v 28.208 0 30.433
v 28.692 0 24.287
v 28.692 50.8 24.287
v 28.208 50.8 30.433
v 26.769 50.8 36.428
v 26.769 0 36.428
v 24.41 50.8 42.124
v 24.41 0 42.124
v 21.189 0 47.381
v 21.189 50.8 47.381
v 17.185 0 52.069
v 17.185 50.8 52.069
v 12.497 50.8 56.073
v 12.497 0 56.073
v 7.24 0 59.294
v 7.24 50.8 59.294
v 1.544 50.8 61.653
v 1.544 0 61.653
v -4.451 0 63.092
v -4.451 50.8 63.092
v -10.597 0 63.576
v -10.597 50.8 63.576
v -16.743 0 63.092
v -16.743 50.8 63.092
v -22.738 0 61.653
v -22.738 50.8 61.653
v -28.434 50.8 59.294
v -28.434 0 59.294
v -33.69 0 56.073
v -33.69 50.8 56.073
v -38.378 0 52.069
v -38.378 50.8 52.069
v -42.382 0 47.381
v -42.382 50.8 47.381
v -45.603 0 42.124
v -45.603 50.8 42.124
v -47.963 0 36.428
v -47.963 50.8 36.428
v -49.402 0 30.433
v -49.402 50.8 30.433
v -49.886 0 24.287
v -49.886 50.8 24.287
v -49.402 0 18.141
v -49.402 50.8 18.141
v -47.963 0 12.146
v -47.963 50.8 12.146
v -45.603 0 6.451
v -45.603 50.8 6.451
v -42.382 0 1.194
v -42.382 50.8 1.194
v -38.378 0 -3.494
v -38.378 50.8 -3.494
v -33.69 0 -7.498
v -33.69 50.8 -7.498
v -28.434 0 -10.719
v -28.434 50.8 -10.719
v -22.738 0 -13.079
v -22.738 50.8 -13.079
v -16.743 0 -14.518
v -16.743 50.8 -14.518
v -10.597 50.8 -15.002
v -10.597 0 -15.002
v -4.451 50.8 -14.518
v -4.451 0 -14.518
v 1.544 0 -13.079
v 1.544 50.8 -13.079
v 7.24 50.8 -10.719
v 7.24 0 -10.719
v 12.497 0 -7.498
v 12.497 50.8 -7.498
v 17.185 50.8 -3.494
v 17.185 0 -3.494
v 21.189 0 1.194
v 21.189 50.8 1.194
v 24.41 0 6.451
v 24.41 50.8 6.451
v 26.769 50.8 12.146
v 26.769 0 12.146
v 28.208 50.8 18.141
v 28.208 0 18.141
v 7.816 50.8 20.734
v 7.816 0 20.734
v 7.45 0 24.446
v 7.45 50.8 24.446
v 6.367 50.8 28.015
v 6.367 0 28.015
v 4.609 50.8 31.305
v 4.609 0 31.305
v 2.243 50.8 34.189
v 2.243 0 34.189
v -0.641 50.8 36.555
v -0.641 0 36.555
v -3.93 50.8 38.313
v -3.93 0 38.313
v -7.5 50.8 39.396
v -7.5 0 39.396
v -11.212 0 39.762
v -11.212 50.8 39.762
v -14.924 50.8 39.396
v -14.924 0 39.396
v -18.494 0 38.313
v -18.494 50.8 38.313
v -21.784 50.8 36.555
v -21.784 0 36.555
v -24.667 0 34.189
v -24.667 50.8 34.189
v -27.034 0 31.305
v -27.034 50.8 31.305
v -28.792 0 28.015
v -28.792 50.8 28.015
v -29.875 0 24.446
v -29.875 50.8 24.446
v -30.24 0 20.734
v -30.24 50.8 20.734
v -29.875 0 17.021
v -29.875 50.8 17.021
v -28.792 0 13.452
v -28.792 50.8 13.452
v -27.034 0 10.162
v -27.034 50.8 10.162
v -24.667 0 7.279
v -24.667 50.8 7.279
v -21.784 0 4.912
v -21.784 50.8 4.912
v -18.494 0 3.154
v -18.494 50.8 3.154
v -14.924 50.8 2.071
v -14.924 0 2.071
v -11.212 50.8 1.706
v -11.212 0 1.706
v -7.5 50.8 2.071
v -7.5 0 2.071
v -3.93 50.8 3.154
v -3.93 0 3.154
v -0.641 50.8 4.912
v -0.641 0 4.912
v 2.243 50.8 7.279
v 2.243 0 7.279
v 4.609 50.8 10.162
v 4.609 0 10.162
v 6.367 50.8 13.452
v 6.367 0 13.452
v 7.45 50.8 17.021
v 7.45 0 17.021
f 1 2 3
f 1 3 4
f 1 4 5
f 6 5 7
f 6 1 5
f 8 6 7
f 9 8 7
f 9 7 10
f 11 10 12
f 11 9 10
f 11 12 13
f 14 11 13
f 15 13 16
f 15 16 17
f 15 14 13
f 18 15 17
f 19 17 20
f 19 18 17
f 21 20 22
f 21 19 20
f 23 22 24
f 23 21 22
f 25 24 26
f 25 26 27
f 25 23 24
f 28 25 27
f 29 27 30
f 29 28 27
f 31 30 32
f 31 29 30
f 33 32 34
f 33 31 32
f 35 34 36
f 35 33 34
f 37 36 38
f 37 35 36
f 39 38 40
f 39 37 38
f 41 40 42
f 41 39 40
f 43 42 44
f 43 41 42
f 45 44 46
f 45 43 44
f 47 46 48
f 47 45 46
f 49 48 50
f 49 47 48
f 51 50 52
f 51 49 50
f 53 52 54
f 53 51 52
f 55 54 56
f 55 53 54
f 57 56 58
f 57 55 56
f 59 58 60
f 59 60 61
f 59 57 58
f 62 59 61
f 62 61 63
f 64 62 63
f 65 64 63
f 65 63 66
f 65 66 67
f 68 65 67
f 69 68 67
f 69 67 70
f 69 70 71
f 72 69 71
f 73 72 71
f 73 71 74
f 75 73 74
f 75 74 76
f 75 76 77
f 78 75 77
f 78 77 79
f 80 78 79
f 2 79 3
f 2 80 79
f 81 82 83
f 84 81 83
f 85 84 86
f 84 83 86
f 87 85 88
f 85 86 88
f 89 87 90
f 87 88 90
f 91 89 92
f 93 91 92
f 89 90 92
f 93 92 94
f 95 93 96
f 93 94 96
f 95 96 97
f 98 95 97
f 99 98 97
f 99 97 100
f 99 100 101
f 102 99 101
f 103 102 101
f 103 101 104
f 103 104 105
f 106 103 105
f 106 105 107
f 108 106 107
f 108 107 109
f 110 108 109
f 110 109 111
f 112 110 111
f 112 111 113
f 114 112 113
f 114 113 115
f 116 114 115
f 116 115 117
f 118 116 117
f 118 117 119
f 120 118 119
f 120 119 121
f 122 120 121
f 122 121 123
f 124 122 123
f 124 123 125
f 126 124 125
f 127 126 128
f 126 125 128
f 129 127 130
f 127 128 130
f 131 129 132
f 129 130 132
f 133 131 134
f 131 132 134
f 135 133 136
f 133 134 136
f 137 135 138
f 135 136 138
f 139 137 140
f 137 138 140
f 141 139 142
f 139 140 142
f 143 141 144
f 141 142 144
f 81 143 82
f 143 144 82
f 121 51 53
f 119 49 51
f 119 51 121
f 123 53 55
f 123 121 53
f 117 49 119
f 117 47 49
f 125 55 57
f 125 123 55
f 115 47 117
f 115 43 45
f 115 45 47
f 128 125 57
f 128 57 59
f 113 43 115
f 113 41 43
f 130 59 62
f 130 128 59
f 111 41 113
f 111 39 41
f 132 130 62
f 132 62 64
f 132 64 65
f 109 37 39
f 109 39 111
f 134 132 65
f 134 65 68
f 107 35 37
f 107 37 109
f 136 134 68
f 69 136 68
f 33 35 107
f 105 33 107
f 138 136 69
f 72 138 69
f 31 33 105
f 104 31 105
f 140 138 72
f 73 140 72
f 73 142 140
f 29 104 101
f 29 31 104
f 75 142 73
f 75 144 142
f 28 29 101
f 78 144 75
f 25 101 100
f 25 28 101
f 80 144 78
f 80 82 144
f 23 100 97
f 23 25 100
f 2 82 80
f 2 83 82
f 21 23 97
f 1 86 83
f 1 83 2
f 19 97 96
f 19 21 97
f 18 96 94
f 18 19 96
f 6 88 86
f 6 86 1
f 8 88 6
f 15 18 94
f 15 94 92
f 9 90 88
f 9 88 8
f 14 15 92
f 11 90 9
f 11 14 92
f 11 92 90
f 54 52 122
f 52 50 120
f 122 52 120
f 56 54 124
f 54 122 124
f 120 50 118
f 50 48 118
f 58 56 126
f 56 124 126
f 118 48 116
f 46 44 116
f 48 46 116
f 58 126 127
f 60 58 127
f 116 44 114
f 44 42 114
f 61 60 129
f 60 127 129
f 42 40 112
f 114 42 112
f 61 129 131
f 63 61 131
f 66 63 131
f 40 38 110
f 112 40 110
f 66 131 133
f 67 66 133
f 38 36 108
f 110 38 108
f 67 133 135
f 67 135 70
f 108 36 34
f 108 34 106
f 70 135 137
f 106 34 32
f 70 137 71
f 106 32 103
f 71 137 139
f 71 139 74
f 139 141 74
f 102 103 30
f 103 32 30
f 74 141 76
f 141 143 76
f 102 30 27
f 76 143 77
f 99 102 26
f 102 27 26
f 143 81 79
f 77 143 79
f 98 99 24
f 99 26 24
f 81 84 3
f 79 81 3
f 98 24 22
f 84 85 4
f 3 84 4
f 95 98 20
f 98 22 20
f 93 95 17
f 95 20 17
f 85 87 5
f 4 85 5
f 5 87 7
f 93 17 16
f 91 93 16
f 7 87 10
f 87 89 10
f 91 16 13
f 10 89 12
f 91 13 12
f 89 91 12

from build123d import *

# Parameters (mm, degrees)
F0_R     = 39.28888
F1_DEPTH = 50.8
F2_R     = 19.028102
F3_DEPTH = 25
F4_DEPTH = 71


with BuildPart() as f1:
    # F0 (on Front) → F1 (new body)
    with BuildSketch(Plane.XZ):
        with Locations((-10.59674, 24.287323)):
            Circle(F0_R)
    extrude(amount=-F1_DEPTH)

    # F2 (on face) → F3 (cut)
    with BuildSketch(Plane.XZ):
        with Locations((-11.212225, 20.733649)):
            Circle(F2_R)
    extrude(amount=F3_DEPTH, mode=Mode.SUBTRACT)

    # F2 (on face) → F4 (cut)
    with BuildSketch(Plane.XZ):
        with Locations((-11.212225, 20.733649)):
            Circle(F2_R)
    extrude(amount=-F4_DEPTH, mode=Mode.SUBTRACT)


solid = f1.part
